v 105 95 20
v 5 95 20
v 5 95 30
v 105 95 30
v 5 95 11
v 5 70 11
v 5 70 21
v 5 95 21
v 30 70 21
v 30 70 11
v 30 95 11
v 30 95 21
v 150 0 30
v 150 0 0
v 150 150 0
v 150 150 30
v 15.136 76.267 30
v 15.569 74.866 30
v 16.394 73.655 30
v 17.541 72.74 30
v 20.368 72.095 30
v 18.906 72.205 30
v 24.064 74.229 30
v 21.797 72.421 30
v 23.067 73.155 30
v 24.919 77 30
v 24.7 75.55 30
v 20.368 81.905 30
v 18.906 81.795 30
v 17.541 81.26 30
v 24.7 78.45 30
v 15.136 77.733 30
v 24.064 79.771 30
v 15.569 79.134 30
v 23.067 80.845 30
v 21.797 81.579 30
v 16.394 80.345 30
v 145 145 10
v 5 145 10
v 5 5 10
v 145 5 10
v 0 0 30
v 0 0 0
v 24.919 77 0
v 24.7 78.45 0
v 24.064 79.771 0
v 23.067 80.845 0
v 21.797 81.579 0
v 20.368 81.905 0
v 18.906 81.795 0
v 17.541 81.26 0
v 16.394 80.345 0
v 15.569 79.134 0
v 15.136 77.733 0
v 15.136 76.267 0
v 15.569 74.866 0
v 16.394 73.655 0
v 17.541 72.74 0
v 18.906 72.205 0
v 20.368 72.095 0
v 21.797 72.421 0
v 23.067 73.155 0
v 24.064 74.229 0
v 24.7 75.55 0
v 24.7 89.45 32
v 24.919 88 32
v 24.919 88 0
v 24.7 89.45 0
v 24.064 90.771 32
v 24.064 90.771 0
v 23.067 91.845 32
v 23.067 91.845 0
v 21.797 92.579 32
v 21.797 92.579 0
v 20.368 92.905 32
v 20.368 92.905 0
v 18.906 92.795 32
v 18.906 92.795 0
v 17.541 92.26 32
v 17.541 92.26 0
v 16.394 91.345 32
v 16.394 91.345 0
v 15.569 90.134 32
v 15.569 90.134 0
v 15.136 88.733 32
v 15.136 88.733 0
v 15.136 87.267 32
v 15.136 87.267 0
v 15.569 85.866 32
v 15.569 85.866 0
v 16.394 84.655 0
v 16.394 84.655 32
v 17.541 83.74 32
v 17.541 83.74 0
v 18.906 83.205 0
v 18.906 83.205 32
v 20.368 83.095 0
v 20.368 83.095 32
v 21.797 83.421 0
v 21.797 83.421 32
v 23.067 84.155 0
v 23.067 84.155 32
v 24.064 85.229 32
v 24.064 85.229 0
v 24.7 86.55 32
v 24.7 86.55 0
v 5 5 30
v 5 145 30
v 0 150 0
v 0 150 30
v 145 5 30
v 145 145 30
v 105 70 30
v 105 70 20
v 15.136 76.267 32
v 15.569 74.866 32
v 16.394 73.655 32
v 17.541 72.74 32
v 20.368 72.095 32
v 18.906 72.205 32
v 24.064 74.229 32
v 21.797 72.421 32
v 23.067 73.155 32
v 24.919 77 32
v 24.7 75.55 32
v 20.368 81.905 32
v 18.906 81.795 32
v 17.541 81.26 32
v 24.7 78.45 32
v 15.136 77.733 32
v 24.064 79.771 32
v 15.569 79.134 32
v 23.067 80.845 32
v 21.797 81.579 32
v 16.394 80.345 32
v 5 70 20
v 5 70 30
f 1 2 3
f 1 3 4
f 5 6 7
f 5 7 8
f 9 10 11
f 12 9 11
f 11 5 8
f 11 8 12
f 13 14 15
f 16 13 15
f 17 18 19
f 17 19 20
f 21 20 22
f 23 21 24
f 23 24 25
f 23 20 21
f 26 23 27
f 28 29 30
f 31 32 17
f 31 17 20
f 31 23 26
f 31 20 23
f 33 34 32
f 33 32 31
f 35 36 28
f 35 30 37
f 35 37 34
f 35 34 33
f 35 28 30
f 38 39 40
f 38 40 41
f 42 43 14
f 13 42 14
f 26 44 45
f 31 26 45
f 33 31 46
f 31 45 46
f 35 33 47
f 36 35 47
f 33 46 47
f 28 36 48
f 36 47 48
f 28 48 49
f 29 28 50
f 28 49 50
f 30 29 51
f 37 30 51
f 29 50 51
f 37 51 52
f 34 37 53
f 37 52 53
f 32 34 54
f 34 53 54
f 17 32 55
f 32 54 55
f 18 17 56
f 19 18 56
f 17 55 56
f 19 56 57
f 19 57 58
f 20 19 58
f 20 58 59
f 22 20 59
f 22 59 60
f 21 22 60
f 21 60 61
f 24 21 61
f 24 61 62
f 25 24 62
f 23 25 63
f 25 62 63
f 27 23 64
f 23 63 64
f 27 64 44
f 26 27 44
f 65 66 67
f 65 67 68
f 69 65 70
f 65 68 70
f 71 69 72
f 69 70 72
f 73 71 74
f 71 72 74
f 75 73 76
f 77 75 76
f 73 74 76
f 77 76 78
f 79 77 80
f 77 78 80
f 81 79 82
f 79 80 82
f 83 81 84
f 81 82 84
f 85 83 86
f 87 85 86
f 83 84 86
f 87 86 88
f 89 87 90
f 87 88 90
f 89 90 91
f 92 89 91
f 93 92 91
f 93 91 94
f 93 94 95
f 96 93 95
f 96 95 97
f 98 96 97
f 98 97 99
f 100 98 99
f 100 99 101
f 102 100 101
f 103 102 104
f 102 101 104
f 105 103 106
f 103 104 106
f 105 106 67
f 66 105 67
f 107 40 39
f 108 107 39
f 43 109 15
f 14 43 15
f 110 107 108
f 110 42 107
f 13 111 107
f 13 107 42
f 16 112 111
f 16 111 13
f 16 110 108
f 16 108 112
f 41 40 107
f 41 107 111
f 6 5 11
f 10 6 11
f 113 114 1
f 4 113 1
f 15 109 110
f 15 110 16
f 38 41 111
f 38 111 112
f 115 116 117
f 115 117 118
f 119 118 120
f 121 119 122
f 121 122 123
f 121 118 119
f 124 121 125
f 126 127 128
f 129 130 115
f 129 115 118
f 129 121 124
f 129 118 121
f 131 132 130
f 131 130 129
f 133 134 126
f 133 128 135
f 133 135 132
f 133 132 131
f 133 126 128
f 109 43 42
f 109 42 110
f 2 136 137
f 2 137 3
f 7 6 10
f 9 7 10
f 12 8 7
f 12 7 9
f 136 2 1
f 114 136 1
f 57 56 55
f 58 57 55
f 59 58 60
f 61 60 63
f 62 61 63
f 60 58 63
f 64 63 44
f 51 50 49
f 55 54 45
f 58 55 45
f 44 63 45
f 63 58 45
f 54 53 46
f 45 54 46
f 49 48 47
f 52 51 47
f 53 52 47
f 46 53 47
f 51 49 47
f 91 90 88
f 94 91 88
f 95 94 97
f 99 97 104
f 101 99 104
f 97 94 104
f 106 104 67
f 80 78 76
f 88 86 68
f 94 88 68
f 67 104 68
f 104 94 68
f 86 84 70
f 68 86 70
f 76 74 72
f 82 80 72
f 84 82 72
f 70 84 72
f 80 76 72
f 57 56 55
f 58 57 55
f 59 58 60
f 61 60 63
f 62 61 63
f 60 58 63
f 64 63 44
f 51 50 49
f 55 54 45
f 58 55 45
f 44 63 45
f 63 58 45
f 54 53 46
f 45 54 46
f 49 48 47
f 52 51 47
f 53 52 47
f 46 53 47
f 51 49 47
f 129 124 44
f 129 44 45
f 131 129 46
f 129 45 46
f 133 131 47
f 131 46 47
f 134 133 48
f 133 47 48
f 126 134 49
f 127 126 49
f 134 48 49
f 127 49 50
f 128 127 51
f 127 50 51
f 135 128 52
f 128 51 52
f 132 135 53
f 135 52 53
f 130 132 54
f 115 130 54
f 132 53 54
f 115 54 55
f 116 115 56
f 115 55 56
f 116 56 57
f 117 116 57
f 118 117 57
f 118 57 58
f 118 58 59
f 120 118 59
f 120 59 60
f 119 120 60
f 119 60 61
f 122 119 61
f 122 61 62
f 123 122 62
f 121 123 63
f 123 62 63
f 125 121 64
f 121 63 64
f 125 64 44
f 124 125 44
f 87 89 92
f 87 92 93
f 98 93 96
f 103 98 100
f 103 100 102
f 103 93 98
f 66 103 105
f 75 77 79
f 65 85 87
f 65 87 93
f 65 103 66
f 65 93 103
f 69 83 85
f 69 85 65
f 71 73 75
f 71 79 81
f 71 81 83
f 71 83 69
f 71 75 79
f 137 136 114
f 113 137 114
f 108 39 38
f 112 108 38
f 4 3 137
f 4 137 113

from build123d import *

# Parameters (mm, degrees)
RECTANGLE001_W   = 140
RECTANGLE001_H   = 140
EXTRUDE001_DEPTH = 50
RECTANGLE_W      = 150
RECTANGLE_H      = 150
EXTRUDE_DEPTH    = 30
RECTANGLE002_W   = 100
RECTANGLE002_H   = 25
EXTRUDE002_DEPTH = 10
RECTANGLE003_W   = 25
RECTANGLE003_H   = 25
EXTRUDE003_DEPTH = 10
CIRCLE_R         = 4.918529
EXTRUDE004_DEPTH = 30
EXTRUDE005_DEPTH = 32
CIRCLE001_R      = 4.918529
EXTRUDE006_DEPTH = 32


with BuildPart() as extrude001:
    # Rectangle001 → Extrude001 (new body)
    with BuildSketch(Plane(origin=(5, 5, 10), x_dir=(1, 0, 0), z_dir=(0, 0, 1))):
        with Locations((70, 70)):
            Rectangle(RECTANGLE001_W, RECTANGLE001_H)
    extrude(amount=EXTRUDE001_DEPTH)


with BuildPart() as cut:
    # Rectangle → Extrude (new body)
    with BuildSketch(Plane.XY):
        with Locations((75, 75)):
            Rectangle(RECTANGLE_W, RECTANGLE_H)
    extrude(amount=EXTRUDE_DEPTH)

    # Cut: cut Extrude001
    add(extrude001.part, mode=Mode.SUBTRACT)


with BuildPart() as extrude002:
    # Rectangle002 → Extrude002 (new body)
    with BuildSketch(Plane(origin=(5, 70, 20), x_dir=(1, 0, 0), z_dir=(0, 0, 1))):
        with Locations((50, 12.5)):
            Rectangle(RECTANGLE002_W, RECTANGLE002_H)
    extrude(amount=EXTRUDE002_DEPTH)


with BuildPart() as extrude003:
    # Rectangle003 → Extrude003 (new body)
    with BuildSketch(Plane(origin=(5, 70, 11), x_dir=(1, 0, 0), z_dir=(0, 0, 1))):
        with Locations((12.5, 12.5)):
            Rectangle(RECTANGLE003_W, RECTANGLE003_H)
    extrude(amount=EXTRUDE003_DEPTH)


with BuildPart() as extrude004:
    # Circle → Extrude004 (new body)
    with BuildSketch(Plane(origin=(20, 77, 0), x_dir=(1, 0, 0), z_dir=(0, 0, 1))):
        Circle(CIRCLE_R)
    extrude(amount=EXTRUDE004_DEPTH)


with BuildPart() as extrude005:
    # Circle → Extrude005 (new body)
    with BuildSketch(Plane(origin=(20, 77, 0), x_dir=(1, 0, 0), z_dir=(0, 0, 1))):
        Circle(CIRCLE_R)
    extrude(amount=EXTRUDE005_DEPTH)


with BuildPart() as extrude006:
    # Circle001 → Extrude006 (new body)
    with BuildSketch(Plane(origin=(20, 88, 0), x_dir=(1, 0, 0), z_dir=(0, 0, 1))):
        Circle(CIRCLE001_R)
    extrude(amount=EXTRUDE006_DEPTH)


solid = Compound([cut.part, extrude002.part, extrude003.part, extrude004.part, extrude005.part, extrude006.part])
